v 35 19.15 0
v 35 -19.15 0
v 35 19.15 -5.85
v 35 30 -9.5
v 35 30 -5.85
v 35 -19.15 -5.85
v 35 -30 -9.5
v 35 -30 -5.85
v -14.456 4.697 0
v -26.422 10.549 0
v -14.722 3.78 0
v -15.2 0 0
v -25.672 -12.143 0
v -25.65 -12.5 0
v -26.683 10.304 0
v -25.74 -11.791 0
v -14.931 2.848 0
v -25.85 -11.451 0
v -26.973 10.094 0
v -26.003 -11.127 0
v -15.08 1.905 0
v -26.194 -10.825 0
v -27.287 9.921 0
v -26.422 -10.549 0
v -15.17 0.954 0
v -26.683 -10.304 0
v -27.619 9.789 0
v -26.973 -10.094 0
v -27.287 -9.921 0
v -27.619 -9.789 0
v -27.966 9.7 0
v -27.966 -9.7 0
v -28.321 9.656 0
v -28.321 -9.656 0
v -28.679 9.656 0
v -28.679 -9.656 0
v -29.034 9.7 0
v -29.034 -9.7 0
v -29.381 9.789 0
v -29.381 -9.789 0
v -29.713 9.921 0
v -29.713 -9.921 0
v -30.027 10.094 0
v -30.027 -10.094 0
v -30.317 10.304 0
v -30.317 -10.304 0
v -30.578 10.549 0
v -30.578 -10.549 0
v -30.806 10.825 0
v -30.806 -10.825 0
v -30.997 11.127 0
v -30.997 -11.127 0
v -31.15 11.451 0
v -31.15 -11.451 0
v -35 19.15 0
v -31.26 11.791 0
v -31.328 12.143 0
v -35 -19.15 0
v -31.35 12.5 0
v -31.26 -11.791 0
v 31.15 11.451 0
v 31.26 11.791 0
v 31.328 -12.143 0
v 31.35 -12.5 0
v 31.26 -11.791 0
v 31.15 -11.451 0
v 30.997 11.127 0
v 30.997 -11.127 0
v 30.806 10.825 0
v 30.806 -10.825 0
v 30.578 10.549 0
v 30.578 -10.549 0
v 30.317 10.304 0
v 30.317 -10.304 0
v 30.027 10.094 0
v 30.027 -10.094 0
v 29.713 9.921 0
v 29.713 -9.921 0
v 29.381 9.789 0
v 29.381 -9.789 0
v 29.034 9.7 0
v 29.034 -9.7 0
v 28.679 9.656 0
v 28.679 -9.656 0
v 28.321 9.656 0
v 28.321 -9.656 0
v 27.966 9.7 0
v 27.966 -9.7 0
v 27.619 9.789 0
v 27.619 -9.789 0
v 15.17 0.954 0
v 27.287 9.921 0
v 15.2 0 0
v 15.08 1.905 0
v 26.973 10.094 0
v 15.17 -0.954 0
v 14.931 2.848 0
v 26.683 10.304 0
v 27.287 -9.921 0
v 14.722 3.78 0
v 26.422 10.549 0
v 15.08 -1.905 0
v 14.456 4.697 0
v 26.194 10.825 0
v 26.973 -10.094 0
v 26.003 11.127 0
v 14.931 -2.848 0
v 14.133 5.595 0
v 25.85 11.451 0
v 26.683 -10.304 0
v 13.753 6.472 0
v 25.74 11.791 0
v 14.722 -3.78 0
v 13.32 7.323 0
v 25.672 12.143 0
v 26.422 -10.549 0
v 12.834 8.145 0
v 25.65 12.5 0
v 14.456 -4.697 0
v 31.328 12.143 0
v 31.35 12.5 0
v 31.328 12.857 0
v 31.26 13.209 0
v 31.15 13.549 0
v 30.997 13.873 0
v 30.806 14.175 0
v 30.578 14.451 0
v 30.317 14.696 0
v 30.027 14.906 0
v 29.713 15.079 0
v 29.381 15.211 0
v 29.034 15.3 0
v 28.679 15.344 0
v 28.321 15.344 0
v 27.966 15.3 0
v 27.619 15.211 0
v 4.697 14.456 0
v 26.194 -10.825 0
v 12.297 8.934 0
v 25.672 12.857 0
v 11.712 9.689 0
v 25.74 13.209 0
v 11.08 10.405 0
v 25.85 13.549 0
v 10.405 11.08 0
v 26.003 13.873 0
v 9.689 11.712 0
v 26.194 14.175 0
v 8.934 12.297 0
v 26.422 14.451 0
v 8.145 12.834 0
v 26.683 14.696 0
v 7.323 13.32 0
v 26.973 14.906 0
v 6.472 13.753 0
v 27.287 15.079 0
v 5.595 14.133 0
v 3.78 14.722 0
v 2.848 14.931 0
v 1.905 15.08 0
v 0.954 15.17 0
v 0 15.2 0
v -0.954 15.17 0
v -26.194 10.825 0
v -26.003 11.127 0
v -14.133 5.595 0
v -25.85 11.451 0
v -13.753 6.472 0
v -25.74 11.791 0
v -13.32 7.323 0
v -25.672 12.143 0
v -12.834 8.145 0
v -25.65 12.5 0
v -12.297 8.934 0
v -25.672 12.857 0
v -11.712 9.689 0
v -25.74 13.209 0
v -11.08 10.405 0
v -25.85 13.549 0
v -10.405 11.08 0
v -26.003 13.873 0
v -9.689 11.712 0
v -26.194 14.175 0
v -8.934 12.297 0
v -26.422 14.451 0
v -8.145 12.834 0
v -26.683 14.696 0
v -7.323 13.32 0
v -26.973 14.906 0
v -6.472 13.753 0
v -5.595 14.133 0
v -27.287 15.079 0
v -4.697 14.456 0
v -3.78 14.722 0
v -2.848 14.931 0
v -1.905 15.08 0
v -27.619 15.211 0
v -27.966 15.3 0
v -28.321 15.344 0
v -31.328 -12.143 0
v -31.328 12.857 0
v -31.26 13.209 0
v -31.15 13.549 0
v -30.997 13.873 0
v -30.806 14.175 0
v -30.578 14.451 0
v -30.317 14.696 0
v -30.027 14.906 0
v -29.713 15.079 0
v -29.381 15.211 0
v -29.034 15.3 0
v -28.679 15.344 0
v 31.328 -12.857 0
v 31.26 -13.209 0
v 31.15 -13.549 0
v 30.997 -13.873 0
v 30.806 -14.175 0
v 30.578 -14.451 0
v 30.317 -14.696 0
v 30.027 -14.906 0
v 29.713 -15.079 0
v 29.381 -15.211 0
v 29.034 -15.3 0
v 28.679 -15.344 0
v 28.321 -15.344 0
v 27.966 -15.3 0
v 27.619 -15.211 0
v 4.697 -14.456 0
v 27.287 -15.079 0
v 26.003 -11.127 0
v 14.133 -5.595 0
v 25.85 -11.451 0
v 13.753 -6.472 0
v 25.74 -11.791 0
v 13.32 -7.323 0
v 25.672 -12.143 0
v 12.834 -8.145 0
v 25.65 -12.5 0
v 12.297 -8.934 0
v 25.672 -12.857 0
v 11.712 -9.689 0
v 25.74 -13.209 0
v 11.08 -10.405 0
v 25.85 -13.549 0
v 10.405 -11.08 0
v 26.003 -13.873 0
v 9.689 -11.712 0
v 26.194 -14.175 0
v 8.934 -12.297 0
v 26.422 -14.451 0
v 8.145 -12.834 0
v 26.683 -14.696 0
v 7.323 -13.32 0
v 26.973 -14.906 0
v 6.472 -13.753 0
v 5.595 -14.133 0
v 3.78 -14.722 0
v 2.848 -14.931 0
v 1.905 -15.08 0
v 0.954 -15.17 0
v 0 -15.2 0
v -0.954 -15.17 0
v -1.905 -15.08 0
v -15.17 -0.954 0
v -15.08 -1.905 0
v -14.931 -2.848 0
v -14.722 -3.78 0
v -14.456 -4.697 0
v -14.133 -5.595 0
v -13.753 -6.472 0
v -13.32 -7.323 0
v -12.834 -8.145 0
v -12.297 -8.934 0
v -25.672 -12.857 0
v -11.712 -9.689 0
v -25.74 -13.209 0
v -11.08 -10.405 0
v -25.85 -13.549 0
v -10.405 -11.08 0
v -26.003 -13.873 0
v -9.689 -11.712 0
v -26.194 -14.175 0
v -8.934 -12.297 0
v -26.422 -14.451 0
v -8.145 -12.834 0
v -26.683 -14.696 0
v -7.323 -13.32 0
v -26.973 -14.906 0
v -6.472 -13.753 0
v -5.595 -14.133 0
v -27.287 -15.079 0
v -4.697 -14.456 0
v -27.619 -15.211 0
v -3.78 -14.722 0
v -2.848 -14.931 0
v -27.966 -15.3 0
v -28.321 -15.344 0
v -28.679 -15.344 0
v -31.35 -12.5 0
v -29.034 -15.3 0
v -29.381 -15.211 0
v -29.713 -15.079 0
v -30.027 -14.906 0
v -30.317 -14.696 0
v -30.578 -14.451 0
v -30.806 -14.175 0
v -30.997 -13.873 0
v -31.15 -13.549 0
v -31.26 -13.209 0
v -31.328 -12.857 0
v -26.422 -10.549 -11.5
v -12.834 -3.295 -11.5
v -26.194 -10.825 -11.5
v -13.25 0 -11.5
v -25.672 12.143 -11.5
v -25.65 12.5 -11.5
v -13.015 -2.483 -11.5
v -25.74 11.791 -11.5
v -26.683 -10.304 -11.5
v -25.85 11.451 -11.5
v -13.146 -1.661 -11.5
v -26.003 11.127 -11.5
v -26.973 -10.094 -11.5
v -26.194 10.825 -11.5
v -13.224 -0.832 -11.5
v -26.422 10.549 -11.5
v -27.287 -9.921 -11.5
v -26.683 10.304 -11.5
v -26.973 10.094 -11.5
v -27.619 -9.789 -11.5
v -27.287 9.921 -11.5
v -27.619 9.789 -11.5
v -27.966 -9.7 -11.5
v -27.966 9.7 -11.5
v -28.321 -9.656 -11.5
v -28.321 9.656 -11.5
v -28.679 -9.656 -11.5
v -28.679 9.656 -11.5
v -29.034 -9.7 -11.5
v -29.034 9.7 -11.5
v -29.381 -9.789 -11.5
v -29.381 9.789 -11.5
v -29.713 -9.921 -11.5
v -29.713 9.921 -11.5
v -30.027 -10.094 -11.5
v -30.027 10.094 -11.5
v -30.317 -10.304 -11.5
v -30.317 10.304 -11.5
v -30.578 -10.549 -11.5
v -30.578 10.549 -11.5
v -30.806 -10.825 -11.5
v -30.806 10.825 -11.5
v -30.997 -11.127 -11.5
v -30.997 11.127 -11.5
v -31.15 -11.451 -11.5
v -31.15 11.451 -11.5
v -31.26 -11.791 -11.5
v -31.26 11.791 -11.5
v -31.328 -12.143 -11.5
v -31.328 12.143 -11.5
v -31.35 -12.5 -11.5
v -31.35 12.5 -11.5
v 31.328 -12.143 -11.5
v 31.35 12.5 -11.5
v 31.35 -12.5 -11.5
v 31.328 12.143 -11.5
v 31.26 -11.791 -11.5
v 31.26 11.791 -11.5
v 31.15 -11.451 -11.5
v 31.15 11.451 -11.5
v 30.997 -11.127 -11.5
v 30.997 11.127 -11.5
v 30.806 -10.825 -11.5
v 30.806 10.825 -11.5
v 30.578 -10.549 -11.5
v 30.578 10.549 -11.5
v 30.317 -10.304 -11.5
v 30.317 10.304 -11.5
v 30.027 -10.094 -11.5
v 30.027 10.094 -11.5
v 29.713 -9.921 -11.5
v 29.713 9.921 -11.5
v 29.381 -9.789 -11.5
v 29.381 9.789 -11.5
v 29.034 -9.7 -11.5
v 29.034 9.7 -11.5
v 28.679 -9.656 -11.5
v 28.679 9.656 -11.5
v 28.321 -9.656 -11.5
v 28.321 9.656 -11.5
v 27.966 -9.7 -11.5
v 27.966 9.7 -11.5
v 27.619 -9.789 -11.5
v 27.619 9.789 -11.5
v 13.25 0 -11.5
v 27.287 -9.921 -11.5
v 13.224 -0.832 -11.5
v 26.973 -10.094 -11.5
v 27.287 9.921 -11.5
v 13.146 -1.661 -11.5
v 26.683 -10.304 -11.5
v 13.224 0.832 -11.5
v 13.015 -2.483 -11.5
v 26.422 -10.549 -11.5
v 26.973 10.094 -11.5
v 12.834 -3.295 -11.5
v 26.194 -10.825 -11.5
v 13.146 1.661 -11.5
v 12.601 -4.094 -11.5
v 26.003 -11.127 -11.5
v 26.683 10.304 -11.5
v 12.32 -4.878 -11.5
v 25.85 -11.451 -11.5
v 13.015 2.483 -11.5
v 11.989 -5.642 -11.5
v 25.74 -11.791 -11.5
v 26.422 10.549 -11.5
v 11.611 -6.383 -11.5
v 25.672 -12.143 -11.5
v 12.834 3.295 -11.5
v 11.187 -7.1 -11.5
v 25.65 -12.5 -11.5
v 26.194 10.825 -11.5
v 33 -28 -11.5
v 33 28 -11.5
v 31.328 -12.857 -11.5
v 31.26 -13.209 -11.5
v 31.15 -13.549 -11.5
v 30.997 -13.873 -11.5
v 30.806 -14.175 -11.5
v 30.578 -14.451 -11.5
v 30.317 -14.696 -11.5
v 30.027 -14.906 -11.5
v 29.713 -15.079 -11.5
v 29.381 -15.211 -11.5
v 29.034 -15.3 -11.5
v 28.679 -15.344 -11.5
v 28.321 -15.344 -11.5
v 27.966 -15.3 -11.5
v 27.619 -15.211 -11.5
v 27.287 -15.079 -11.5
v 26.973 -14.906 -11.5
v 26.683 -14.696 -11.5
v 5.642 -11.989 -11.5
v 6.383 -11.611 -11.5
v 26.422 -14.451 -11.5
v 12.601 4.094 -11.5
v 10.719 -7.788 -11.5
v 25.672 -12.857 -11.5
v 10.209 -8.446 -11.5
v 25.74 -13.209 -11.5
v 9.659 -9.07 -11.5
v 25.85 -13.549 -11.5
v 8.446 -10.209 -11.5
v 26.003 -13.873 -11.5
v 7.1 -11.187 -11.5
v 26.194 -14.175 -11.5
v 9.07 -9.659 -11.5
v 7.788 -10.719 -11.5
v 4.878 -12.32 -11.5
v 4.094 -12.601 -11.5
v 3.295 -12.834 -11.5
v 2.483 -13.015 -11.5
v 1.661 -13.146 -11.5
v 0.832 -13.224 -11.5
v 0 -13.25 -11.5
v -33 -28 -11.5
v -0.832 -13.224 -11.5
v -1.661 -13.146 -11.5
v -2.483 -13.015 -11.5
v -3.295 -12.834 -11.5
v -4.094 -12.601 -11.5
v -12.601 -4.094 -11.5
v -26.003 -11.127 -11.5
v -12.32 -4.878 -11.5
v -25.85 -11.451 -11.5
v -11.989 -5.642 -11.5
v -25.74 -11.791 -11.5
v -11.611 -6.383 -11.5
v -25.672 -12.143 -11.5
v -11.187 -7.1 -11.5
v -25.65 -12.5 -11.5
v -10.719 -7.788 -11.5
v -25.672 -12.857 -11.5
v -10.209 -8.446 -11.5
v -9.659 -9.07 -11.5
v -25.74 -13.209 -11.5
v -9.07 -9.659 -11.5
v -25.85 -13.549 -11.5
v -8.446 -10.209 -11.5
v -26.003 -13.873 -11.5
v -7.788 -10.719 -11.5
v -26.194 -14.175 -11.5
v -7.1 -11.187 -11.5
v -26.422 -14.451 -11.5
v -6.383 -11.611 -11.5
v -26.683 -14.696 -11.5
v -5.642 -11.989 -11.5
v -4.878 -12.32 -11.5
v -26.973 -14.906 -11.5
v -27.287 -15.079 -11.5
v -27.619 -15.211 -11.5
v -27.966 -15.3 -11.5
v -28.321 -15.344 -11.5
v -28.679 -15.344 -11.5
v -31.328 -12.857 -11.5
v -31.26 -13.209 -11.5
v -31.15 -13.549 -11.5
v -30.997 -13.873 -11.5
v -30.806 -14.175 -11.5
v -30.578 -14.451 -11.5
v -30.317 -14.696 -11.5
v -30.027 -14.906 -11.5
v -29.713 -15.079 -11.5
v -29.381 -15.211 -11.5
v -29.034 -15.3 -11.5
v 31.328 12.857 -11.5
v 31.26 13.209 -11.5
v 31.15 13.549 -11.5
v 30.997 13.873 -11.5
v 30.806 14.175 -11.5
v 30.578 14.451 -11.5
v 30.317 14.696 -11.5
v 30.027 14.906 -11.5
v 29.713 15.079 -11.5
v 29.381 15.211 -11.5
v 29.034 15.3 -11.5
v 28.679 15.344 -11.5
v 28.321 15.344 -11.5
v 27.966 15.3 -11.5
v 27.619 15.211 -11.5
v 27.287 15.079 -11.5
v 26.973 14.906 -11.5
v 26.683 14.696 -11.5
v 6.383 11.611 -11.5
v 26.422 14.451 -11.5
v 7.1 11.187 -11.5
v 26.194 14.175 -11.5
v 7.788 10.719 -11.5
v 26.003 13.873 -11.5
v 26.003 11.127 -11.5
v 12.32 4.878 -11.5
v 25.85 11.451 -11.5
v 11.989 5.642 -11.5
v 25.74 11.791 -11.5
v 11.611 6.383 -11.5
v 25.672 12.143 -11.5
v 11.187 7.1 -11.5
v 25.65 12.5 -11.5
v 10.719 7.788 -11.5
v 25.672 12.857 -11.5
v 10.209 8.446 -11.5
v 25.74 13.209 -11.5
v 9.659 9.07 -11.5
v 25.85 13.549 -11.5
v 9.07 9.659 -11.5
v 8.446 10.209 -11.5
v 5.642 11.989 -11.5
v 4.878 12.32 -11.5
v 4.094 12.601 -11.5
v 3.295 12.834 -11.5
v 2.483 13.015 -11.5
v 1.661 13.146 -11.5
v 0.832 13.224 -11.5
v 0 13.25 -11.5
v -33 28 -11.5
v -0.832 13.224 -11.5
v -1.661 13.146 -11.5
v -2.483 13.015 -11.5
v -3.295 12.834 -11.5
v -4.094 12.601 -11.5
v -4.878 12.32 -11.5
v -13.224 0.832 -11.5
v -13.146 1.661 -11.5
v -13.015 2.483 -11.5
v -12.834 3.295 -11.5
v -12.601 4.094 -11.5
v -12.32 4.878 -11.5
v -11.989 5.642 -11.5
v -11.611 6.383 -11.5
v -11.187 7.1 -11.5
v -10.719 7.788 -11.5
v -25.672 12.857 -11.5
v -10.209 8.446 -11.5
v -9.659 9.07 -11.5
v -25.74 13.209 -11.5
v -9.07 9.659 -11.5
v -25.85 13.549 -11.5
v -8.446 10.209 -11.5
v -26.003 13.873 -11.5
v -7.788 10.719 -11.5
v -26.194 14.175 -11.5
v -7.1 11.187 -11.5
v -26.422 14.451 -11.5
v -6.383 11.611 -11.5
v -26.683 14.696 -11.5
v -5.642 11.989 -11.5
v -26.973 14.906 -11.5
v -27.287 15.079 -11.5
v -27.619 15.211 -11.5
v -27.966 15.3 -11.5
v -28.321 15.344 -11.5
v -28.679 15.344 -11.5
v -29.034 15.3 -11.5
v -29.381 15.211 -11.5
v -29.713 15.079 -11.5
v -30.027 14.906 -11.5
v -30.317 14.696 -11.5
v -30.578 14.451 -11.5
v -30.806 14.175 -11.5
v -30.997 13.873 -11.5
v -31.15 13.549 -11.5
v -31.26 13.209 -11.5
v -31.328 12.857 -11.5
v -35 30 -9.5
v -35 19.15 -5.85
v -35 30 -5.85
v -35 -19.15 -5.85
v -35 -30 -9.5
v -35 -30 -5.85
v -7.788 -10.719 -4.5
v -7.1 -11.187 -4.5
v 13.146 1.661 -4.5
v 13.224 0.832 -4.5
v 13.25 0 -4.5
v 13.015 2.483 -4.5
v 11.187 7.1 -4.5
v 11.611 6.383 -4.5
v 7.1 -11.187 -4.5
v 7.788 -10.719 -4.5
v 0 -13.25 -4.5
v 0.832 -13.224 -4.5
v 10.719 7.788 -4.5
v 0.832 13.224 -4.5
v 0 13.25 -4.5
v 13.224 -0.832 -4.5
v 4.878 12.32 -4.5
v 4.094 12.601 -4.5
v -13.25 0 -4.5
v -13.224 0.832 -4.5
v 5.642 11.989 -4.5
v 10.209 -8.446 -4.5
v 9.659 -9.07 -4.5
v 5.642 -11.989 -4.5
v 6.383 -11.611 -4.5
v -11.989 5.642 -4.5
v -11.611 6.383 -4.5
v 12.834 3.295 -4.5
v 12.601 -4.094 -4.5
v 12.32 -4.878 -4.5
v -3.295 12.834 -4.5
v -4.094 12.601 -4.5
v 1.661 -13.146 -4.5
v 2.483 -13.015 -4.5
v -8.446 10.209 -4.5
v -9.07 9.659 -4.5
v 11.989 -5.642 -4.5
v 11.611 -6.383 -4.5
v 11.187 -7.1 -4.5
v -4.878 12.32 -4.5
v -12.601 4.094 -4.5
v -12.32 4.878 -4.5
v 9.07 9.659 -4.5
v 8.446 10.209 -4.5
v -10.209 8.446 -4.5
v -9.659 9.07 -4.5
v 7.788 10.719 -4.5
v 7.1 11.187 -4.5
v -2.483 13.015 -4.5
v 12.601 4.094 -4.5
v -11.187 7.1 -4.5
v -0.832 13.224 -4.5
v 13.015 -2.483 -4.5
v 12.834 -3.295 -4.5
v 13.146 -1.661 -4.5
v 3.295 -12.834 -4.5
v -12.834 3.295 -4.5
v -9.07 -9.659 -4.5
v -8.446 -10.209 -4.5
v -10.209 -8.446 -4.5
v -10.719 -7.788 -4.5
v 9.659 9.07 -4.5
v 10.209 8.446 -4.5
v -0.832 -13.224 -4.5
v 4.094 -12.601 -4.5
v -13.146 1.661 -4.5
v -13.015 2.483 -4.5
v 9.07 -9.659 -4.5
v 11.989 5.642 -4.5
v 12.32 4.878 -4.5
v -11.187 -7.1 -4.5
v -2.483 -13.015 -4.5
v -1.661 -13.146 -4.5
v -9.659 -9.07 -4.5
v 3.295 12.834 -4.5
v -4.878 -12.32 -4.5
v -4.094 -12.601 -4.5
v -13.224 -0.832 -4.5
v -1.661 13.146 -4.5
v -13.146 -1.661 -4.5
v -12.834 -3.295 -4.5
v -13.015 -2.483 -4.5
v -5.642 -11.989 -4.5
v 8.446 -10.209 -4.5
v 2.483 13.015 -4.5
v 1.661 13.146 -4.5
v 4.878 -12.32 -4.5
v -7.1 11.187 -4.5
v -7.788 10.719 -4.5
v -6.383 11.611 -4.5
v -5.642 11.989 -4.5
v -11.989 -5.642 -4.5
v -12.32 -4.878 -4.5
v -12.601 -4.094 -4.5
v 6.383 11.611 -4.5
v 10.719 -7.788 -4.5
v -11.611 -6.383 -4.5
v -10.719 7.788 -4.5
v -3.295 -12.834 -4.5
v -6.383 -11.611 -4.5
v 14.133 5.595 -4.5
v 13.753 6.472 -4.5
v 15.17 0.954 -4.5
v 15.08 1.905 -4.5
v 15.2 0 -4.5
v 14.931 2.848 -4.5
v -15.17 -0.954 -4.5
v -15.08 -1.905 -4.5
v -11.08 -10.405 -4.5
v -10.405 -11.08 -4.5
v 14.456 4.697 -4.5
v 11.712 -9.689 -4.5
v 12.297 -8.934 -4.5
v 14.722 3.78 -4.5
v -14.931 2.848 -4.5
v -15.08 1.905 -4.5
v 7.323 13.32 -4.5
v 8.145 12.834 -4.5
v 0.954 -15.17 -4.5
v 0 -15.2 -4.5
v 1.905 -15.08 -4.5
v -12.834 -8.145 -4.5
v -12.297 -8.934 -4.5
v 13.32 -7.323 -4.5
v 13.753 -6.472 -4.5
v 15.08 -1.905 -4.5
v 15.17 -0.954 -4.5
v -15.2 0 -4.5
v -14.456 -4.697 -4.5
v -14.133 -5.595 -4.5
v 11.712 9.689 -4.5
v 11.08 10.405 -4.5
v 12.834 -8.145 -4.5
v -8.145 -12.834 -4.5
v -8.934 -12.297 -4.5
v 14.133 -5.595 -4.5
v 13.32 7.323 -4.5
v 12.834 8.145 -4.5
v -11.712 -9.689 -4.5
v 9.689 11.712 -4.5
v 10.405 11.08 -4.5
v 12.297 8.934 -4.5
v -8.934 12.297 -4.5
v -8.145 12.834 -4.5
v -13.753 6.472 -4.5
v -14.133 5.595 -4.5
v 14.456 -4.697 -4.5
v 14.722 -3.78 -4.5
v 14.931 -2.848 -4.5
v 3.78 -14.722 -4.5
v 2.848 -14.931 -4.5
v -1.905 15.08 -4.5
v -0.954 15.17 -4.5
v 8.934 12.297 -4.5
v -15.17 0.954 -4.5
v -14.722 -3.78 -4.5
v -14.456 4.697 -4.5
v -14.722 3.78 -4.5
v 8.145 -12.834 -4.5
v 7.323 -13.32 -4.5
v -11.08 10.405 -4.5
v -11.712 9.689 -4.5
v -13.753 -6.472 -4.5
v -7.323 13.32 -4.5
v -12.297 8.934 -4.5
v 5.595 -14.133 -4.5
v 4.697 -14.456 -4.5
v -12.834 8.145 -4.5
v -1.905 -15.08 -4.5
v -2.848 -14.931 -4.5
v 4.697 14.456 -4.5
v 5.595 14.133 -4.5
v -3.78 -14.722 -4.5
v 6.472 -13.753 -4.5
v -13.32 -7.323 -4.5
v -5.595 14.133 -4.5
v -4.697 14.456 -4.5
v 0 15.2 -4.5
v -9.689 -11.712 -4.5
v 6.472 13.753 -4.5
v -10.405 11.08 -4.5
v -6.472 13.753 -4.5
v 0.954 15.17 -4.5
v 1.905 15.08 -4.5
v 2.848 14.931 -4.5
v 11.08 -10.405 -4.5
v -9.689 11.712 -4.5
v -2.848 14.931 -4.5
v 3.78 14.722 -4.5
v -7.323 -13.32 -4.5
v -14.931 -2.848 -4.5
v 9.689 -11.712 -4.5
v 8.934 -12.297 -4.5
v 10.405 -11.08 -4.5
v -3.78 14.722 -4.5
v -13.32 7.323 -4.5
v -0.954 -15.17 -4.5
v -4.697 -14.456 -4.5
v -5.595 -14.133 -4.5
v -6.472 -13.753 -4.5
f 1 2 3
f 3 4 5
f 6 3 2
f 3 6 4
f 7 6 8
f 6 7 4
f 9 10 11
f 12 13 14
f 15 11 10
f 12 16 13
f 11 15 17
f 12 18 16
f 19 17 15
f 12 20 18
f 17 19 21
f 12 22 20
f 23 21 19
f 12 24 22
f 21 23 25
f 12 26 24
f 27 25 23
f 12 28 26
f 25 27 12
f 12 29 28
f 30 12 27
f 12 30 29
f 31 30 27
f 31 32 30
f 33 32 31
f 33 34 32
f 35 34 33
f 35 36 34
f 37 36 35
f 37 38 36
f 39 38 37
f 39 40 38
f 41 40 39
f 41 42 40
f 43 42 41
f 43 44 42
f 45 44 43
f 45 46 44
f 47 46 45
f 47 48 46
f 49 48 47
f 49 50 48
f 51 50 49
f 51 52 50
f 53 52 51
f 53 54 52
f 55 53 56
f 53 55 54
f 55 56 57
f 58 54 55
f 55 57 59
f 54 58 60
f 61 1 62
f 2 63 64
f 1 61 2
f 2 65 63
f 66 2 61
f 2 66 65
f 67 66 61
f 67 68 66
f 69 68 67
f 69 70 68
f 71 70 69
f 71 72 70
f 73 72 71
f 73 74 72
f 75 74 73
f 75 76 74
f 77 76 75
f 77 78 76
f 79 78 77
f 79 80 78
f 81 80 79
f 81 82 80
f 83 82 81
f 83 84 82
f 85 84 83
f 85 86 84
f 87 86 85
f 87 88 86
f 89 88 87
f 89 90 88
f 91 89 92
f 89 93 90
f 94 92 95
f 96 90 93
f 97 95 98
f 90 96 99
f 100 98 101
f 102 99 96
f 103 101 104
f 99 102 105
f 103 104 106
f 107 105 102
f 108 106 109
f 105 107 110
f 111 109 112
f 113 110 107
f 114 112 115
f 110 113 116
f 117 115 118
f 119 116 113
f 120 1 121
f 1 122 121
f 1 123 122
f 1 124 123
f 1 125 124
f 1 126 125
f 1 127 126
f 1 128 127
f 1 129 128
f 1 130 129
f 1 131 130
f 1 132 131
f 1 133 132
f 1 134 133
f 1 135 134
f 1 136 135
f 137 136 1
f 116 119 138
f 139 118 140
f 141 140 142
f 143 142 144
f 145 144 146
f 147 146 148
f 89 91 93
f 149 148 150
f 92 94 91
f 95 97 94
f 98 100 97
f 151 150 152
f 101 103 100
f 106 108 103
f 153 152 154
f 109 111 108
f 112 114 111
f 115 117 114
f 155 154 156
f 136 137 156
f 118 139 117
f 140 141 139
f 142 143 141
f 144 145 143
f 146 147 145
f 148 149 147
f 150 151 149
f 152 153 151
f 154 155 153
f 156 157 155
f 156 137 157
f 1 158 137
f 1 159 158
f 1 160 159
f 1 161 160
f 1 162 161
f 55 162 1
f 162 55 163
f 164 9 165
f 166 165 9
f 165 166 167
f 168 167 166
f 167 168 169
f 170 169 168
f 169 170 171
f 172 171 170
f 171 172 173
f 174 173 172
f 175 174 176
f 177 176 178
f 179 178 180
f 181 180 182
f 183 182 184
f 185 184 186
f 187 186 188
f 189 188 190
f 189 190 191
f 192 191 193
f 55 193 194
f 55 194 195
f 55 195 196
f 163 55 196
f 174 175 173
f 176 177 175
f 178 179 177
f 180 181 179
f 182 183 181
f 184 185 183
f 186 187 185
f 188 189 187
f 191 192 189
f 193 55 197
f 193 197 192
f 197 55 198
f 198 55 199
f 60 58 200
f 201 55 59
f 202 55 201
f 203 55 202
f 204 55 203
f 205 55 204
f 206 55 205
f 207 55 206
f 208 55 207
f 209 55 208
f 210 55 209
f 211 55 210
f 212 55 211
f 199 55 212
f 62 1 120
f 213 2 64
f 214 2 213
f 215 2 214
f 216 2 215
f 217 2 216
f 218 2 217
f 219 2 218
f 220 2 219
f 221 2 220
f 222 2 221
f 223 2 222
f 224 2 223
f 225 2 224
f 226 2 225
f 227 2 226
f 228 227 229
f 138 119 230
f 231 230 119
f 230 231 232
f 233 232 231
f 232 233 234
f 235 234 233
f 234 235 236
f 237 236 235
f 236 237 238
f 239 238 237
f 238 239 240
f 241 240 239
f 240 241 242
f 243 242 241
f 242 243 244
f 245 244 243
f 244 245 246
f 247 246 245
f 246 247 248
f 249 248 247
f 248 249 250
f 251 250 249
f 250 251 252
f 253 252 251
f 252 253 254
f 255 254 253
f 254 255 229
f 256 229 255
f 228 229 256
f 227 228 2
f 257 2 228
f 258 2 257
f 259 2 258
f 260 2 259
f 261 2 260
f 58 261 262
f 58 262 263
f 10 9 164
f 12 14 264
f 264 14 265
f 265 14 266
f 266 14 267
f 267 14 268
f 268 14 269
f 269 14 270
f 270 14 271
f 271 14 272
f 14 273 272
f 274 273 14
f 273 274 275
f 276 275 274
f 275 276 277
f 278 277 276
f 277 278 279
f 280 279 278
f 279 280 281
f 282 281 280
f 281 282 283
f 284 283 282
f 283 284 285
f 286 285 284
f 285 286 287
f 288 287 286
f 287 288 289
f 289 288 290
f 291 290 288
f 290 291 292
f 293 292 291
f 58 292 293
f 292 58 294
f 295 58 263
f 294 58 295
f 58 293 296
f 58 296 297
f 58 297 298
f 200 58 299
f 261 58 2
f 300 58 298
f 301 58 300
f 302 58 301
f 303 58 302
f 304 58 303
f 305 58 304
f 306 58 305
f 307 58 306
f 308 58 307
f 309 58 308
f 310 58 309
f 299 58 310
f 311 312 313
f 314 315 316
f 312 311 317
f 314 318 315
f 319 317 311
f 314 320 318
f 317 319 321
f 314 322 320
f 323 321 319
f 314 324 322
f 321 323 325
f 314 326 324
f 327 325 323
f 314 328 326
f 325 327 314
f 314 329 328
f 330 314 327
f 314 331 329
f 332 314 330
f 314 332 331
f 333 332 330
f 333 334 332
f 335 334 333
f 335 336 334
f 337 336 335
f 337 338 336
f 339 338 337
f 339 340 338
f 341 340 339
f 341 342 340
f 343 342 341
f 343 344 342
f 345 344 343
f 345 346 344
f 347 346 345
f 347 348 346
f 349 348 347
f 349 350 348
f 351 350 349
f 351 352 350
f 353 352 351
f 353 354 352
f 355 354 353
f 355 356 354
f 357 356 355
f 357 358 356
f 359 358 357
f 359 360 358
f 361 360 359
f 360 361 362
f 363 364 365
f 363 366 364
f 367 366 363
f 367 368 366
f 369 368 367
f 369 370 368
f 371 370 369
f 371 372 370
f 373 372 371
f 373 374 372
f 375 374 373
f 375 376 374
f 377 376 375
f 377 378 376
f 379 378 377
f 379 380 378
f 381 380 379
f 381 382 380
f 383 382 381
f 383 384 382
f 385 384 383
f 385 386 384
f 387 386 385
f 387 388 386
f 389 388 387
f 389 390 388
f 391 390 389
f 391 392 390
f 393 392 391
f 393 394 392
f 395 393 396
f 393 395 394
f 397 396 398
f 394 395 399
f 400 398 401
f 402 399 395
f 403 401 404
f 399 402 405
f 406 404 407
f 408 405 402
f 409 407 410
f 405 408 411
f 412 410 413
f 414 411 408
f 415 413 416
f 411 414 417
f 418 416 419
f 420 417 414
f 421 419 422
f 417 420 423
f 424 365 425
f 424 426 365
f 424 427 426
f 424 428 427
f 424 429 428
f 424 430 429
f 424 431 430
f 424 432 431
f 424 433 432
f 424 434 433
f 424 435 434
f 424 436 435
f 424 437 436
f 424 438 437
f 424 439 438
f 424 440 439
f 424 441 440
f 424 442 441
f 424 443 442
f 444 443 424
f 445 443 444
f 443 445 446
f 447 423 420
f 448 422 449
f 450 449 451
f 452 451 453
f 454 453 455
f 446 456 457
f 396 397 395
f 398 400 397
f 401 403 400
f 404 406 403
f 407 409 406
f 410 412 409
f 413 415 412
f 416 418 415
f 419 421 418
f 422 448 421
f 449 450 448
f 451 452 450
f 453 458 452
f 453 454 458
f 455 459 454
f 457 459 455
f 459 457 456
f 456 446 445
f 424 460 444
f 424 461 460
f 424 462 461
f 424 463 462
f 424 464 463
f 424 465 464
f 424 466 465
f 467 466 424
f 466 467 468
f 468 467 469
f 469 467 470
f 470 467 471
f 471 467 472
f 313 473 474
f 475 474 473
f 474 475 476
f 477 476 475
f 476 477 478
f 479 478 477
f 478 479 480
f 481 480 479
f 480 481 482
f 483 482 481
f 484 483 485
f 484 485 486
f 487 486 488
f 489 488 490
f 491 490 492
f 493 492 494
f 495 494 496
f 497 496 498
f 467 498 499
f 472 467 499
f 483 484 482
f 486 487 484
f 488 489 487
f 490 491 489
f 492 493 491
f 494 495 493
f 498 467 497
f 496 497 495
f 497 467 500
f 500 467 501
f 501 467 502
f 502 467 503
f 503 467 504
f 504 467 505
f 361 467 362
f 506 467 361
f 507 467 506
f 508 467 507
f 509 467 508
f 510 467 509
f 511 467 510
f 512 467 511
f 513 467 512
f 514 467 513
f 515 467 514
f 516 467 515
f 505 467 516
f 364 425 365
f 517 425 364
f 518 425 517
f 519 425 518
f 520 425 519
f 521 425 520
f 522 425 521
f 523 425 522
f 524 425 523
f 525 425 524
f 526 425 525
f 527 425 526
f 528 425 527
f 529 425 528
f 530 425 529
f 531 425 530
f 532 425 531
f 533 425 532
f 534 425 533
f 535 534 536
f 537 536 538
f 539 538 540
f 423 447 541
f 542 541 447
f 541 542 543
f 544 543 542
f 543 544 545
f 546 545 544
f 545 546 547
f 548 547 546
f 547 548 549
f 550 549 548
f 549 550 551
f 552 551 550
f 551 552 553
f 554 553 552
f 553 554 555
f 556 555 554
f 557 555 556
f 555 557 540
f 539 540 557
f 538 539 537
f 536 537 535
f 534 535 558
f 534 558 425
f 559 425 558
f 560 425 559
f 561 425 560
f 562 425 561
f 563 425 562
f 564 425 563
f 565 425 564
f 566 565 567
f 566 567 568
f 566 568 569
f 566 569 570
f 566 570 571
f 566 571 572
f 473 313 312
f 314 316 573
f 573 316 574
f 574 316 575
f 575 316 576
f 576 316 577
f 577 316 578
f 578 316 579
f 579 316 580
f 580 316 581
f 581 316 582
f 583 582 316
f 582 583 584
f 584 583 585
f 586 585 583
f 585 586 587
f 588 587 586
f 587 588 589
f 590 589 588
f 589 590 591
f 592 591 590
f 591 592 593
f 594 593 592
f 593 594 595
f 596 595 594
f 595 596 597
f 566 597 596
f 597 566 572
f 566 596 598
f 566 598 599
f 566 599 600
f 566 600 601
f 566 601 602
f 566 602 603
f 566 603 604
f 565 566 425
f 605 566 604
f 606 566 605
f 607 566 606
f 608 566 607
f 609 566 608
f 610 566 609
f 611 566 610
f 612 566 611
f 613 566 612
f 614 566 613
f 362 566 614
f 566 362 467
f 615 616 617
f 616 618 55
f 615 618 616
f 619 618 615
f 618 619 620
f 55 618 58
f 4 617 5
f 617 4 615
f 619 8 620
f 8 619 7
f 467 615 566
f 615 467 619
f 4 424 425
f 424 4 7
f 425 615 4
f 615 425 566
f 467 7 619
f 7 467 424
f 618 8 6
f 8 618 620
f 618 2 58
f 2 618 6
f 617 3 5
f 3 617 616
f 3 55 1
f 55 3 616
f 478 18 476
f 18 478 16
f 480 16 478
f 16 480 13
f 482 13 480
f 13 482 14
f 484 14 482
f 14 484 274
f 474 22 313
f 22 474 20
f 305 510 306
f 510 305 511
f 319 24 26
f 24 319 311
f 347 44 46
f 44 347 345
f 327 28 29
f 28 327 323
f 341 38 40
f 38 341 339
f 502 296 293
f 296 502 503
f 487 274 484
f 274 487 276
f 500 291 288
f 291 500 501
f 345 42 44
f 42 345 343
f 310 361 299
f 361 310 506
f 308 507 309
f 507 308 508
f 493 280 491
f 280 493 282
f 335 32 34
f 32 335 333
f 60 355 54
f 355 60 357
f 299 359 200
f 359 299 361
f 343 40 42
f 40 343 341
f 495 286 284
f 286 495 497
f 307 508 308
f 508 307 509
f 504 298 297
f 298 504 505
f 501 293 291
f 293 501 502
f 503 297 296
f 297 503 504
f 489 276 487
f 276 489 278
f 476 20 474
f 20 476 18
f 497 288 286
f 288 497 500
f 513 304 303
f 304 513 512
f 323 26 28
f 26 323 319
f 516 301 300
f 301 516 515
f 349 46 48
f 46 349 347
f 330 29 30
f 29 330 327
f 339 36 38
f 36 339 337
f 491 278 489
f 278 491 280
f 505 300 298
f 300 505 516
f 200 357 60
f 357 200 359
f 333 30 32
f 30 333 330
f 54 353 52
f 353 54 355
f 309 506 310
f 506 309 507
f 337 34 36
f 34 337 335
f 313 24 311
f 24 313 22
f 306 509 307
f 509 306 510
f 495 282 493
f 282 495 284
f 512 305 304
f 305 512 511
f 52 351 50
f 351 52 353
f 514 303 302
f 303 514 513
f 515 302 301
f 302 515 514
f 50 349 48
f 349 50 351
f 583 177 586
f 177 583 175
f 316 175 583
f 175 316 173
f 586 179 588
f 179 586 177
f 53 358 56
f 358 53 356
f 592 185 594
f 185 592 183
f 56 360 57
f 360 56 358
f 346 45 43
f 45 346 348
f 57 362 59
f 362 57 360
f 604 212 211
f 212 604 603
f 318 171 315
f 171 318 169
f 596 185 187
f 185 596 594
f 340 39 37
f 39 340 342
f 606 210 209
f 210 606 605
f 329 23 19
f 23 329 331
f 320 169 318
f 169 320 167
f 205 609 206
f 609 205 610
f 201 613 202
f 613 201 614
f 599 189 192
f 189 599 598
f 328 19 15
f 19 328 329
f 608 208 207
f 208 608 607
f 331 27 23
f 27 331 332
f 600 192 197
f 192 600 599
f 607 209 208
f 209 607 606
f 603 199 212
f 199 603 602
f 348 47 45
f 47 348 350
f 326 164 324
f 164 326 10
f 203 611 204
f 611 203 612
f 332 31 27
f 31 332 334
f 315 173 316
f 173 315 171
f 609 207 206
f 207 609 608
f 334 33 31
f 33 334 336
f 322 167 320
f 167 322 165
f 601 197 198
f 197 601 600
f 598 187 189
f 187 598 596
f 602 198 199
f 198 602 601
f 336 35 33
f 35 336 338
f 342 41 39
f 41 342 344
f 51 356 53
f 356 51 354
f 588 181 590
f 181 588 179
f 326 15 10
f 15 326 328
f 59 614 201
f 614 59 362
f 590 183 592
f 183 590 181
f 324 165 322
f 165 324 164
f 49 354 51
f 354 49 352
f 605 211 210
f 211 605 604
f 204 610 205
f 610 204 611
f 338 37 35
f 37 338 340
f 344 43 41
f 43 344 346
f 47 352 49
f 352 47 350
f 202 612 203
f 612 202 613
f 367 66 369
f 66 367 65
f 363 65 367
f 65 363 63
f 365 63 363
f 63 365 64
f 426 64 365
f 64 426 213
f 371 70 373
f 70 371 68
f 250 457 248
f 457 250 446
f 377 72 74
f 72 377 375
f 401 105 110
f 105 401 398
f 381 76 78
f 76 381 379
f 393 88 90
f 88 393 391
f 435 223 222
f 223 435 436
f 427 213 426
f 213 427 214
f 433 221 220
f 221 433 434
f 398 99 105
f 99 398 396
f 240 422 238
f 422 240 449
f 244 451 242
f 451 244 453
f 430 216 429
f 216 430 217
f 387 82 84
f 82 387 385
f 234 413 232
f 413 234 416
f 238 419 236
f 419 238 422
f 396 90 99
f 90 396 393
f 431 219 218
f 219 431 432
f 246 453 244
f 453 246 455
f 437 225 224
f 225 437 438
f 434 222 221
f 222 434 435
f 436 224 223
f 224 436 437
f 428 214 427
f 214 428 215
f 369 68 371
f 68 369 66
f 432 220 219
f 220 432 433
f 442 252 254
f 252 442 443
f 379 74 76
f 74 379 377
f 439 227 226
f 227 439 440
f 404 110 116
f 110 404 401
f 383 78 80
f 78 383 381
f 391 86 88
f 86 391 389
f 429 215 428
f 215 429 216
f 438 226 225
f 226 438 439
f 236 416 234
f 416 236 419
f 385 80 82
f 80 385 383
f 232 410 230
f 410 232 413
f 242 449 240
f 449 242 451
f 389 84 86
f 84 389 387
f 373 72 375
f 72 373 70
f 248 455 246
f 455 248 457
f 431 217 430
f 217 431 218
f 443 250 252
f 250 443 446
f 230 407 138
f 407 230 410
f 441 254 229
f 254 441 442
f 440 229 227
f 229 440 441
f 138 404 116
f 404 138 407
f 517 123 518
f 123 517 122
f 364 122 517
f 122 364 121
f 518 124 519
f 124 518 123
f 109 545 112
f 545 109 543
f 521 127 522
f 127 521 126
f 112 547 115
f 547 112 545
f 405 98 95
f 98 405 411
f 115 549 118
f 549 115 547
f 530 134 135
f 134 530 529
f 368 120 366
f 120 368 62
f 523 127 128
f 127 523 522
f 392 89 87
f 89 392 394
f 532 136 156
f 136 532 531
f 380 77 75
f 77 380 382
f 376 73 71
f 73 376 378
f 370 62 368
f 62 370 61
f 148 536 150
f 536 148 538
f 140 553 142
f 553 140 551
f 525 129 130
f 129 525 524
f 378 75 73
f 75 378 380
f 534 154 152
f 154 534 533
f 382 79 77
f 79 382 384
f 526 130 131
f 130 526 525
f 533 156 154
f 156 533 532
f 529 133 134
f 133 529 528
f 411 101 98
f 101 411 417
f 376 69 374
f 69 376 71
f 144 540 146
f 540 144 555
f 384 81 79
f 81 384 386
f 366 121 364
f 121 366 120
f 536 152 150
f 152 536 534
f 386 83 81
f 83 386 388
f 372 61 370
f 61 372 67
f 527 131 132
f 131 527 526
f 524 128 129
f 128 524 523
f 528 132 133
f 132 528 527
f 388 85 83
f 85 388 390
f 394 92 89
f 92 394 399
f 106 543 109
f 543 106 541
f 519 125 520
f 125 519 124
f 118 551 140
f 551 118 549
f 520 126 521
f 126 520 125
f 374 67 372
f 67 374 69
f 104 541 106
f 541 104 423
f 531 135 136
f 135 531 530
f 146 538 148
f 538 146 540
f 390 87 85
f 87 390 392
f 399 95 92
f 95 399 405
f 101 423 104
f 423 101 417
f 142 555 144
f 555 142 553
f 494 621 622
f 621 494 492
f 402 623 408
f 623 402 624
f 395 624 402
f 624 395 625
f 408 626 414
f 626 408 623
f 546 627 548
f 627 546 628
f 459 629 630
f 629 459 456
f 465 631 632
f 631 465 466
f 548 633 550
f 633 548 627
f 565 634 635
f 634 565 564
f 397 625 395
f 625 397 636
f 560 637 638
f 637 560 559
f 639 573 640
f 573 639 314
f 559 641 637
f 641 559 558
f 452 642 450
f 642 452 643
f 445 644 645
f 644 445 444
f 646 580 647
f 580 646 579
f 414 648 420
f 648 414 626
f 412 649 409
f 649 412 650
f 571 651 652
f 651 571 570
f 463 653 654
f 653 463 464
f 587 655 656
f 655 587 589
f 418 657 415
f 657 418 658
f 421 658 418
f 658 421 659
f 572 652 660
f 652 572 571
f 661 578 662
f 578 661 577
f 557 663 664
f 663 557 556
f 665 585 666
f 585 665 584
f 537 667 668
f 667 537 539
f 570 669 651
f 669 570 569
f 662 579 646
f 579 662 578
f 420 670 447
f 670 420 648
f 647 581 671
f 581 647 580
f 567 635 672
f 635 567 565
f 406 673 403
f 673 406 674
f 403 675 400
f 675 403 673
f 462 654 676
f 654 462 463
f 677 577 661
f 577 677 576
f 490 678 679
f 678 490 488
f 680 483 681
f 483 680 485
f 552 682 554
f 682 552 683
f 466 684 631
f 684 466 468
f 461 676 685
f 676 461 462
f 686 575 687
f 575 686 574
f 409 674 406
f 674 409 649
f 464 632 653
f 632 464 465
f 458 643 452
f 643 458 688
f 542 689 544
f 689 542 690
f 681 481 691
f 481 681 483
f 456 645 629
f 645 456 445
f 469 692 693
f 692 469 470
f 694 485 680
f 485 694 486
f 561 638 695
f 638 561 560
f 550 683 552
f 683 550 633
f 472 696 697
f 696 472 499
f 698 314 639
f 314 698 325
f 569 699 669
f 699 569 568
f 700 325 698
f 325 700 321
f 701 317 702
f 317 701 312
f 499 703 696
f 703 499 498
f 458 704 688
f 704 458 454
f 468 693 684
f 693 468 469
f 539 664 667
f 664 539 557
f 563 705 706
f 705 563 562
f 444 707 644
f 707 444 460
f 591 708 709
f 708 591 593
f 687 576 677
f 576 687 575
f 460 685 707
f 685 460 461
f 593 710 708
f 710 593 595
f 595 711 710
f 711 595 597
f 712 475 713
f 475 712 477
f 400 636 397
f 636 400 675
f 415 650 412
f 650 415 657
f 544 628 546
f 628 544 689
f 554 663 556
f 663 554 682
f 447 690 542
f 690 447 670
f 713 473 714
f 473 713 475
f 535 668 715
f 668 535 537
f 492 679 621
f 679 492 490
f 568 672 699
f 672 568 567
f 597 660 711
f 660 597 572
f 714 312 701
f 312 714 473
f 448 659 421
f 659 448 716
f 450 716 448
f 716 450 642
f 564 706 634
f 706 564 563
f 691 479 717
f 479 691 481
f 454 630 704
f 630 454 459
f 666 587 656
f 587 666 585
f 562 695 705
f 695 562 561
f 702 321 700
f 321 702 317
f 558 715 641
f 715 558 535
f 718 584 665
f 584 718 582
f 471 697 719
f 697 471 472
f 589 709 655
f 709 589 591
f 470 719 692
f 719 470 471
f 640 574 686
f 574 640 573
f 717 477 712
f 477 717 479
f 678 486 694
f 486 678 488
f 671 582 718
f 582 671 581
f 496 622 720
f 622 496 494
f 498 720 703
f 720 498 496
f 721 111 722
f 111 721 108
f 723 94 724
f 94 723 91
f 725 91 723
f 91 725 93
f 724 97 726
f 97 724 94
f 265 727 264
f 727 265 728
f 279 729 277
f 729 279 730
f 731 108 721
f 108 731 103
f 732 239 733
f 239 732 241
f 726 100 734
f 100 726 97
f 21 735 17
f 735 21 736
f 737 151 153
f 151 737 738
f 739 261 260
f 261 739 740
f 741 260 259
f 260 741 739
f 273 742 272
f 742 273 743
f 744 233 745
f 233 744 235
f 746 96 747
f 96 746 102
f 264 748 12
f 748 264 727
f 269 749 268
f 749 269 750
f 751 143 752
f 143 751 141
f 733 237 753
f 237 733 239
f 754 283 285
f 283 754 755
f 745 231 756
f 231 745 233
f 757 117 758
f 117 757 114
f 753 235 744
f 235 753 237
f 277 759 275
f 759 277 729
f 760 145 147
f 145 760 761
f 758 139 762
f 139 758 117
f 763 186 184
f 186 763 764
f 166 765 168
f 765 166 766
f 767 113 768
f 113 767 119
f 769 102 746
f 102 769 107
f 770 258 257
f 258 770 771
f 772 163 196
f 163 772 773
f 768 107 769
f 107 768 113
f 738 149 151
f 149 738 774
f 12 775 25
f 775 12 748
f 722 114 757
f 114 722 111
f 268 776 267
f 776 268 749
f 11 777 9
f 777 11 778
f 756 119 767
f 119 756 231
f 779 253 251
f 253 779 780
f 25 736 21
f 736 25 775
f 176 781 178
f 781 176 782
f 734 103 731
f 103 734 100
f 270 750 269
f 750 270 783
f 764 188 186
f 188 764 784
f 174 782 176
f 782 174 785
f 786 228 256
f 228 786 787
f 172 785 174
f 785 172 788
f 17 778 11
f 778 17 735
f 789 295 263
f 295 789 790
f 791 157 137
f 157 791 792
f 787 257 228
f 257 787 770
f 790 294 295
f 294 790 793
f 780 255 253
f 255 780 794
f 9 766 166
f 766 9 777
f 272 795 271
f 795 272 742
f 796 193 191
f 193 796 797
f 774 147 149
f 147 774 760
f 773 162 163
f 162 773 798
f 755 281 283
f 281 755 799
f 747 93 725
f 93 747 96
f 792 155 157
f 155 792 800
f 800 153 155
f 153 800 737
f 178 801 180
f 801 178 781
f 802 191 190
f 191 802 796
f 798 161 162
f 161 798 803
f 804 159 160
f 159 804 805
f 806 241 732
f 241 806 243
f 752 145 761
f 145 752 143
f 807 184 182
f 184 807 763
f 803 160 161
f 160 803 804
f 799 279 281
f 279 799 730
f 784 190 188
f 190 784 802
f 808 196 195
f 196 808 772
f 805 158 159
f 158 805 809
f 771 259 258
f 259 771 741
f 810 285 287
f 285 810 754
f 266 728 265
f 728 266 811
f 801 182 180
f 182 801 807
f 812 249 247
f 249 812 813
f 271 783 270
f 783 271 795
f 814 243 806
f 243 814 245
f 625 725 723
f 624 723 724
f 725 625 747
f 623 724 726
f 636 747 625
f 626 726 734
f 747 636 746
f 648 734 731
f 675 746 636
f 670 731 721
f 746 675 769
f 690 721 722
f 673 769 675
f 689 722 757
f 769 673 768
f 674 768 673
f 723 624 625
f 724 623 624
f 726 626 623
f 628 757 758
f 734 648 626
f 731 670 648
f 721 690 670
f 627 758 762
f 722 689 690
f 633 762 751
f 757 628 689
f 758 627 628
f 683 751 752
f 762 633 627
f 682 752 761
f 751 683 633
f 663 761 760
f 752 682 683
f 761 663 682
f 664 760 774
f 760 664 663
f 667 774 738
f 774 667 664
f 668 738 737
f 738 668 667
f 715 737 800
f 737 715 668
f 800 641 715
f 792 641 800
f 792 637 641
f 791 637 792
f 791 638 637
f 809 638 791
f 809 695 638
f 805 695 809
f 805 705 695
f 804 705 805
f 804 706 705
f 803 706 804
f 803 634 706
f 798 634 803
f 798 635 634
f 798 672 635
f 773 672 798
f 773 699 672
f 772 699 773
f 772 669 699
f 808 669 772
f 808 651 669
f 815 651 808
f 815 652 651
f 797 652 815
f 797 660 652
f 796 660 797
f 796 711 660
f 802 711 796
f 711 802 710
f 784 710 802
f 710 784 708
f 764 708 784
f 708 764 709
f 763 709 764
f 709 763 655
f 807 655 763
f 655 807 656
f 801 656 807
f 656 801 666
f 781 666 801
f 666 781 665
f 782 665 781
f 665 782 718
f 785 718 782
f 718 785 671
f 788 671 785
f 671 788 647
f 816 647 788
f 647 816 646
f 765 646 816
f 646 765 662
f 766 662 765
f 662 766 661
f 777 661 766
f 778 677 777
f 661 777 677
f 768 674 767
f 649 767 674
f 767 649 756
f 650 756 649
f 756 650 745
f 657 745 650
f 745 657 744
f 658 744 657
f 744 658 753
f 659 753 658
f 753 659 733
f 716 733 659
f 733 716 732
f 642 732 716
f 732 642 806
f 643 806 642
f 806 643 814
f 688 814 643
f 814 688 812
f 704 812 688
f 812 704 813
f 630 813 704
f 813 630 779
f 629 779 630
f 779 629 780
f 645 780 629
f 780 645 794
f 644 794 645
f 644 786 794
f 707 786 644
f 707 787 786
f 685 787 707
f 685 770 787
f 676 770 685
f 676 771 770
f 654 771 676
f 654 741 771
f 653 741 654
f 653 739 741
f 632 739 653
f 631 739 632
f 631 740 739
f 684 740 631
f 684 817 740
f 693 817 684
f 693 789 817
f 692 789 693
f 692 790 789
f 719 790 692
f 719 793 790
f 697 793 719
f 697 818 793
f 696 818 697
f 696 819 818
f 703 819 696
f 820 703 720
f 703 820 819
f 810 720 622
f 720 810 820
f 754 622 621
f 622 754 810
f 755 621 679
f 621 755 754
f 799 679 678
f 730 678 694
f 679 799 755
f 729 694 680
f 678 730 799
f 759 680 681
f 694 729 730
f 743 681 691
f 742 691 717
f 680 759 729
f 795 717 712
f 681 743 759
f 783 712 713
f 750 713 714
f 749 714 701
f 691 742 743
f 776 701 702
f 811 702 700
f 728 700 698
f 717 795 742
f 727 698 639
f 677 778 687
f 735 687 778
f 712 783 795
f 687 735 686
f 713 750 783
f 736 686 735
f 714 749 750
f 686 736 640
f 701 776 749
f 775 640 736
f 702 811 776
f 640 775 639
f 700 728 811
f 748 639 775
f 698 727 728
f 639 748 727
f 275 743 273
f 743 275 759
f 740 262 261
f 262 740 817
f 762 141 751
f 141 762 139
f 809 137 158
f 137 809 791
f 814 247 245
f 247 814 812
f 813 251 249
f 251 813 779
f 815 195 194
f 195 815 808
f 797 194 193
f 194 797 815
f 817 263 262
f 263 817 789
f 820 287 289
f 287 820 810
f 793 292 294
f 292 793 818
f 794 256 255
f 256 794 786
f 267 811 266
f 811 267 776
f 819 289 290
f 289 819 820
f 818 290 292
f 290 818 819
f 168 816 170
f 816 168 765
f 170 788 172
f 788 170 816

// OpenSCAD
// file: YFrame.scad
/* Rahmenteile für die Y-Achse (Platine bewegt)
 */

/* Durchmesser Aluprofile */
stab_d = 11.7;

/* Abstand der Schienen (Mitte-Mitte) */
schienen = 50;

/* Blockhöhe - Schraube M5x30:
 * 30mm - 2*1mm (Unterlegscheibe) - 4.5mm = 23.5mm
 */
blockh = 23;

/* Höhe der Y-Einheit */
yframe_h = 60;

module halfchamfered_box(x, y, z, cham) {
	difference() {
		cube([x, y, z]);
		translate([0,-1,0]) rotate(-90, [1,0,0]) linear_extrude(height=y+2) union() {
			polygon([
				[-1, 1],
				[-1, -cham-1],
				[cham+1, 1]
			]);
			polygon([
				[x+1, 1],
				[x+1, -cham-1],
				[x-cham-1, 1]
			]);
		};
		translate([-1,0,0]) rotate(90, [0,1,0]) linear_extrude(height=x+2) union() {
			polygon([
				[1, -1],
				[1, cham+1],
				[-cham-1, -1]
			]);
			polygon([
				[1, y+1],
				[1, y-cham-1],
				[-cham-1, y+1]
			]);
		};
	}
}

module yframe_klemmleiste(breite = 50) {
	difference() {
		translate([-breite/2,-yframe_h/2,-blockh/2]) halfchamfered_box(breite, yframe_h, blockh/2, 2);

		for (y = [-1, +1]) {
			translate([0, y*schienen/2, 0]) cube([100, stab_d, stab_d], true);
		}
	}
}
// main file
include <YFrame.scad>;

d_kugellager = 30.4;
h_kugellager = 9;

difference() {
	yframe_klemmleiste(breite = 70);

	cylinder(h=100, r=26.5/2, $fn=100, center=true);
	cylinder(h=h_kugellager, r=d_kugellager/2, $fn=100, center=true);
	for (x = [-1, +1]) {
		for (y = [-25/2, +25/2]) {
			translate([x*57/2, y, 0]) cylinder(h=100, r=5.7/2, $fn=50, center=true);
		}
	}
}

/* Bereich, in dem am Gegenstück der Schrittmotor montiert wird,
 * muss also für das äußere Schraubenpaar freigehalten werden
 */
% union() {
	cylinder(h=100, center=true, r=25/2, $fn=30);
	for (x = [-1, +1]) {
	for (y = [-1, +1]) {
		translate([x * 31/2, y * 31/2, 0]) cylinder(h=100, r=4.3/2, $fn=20, center=true);
	}
	}
	cube([45, 45, 100], true);
}
